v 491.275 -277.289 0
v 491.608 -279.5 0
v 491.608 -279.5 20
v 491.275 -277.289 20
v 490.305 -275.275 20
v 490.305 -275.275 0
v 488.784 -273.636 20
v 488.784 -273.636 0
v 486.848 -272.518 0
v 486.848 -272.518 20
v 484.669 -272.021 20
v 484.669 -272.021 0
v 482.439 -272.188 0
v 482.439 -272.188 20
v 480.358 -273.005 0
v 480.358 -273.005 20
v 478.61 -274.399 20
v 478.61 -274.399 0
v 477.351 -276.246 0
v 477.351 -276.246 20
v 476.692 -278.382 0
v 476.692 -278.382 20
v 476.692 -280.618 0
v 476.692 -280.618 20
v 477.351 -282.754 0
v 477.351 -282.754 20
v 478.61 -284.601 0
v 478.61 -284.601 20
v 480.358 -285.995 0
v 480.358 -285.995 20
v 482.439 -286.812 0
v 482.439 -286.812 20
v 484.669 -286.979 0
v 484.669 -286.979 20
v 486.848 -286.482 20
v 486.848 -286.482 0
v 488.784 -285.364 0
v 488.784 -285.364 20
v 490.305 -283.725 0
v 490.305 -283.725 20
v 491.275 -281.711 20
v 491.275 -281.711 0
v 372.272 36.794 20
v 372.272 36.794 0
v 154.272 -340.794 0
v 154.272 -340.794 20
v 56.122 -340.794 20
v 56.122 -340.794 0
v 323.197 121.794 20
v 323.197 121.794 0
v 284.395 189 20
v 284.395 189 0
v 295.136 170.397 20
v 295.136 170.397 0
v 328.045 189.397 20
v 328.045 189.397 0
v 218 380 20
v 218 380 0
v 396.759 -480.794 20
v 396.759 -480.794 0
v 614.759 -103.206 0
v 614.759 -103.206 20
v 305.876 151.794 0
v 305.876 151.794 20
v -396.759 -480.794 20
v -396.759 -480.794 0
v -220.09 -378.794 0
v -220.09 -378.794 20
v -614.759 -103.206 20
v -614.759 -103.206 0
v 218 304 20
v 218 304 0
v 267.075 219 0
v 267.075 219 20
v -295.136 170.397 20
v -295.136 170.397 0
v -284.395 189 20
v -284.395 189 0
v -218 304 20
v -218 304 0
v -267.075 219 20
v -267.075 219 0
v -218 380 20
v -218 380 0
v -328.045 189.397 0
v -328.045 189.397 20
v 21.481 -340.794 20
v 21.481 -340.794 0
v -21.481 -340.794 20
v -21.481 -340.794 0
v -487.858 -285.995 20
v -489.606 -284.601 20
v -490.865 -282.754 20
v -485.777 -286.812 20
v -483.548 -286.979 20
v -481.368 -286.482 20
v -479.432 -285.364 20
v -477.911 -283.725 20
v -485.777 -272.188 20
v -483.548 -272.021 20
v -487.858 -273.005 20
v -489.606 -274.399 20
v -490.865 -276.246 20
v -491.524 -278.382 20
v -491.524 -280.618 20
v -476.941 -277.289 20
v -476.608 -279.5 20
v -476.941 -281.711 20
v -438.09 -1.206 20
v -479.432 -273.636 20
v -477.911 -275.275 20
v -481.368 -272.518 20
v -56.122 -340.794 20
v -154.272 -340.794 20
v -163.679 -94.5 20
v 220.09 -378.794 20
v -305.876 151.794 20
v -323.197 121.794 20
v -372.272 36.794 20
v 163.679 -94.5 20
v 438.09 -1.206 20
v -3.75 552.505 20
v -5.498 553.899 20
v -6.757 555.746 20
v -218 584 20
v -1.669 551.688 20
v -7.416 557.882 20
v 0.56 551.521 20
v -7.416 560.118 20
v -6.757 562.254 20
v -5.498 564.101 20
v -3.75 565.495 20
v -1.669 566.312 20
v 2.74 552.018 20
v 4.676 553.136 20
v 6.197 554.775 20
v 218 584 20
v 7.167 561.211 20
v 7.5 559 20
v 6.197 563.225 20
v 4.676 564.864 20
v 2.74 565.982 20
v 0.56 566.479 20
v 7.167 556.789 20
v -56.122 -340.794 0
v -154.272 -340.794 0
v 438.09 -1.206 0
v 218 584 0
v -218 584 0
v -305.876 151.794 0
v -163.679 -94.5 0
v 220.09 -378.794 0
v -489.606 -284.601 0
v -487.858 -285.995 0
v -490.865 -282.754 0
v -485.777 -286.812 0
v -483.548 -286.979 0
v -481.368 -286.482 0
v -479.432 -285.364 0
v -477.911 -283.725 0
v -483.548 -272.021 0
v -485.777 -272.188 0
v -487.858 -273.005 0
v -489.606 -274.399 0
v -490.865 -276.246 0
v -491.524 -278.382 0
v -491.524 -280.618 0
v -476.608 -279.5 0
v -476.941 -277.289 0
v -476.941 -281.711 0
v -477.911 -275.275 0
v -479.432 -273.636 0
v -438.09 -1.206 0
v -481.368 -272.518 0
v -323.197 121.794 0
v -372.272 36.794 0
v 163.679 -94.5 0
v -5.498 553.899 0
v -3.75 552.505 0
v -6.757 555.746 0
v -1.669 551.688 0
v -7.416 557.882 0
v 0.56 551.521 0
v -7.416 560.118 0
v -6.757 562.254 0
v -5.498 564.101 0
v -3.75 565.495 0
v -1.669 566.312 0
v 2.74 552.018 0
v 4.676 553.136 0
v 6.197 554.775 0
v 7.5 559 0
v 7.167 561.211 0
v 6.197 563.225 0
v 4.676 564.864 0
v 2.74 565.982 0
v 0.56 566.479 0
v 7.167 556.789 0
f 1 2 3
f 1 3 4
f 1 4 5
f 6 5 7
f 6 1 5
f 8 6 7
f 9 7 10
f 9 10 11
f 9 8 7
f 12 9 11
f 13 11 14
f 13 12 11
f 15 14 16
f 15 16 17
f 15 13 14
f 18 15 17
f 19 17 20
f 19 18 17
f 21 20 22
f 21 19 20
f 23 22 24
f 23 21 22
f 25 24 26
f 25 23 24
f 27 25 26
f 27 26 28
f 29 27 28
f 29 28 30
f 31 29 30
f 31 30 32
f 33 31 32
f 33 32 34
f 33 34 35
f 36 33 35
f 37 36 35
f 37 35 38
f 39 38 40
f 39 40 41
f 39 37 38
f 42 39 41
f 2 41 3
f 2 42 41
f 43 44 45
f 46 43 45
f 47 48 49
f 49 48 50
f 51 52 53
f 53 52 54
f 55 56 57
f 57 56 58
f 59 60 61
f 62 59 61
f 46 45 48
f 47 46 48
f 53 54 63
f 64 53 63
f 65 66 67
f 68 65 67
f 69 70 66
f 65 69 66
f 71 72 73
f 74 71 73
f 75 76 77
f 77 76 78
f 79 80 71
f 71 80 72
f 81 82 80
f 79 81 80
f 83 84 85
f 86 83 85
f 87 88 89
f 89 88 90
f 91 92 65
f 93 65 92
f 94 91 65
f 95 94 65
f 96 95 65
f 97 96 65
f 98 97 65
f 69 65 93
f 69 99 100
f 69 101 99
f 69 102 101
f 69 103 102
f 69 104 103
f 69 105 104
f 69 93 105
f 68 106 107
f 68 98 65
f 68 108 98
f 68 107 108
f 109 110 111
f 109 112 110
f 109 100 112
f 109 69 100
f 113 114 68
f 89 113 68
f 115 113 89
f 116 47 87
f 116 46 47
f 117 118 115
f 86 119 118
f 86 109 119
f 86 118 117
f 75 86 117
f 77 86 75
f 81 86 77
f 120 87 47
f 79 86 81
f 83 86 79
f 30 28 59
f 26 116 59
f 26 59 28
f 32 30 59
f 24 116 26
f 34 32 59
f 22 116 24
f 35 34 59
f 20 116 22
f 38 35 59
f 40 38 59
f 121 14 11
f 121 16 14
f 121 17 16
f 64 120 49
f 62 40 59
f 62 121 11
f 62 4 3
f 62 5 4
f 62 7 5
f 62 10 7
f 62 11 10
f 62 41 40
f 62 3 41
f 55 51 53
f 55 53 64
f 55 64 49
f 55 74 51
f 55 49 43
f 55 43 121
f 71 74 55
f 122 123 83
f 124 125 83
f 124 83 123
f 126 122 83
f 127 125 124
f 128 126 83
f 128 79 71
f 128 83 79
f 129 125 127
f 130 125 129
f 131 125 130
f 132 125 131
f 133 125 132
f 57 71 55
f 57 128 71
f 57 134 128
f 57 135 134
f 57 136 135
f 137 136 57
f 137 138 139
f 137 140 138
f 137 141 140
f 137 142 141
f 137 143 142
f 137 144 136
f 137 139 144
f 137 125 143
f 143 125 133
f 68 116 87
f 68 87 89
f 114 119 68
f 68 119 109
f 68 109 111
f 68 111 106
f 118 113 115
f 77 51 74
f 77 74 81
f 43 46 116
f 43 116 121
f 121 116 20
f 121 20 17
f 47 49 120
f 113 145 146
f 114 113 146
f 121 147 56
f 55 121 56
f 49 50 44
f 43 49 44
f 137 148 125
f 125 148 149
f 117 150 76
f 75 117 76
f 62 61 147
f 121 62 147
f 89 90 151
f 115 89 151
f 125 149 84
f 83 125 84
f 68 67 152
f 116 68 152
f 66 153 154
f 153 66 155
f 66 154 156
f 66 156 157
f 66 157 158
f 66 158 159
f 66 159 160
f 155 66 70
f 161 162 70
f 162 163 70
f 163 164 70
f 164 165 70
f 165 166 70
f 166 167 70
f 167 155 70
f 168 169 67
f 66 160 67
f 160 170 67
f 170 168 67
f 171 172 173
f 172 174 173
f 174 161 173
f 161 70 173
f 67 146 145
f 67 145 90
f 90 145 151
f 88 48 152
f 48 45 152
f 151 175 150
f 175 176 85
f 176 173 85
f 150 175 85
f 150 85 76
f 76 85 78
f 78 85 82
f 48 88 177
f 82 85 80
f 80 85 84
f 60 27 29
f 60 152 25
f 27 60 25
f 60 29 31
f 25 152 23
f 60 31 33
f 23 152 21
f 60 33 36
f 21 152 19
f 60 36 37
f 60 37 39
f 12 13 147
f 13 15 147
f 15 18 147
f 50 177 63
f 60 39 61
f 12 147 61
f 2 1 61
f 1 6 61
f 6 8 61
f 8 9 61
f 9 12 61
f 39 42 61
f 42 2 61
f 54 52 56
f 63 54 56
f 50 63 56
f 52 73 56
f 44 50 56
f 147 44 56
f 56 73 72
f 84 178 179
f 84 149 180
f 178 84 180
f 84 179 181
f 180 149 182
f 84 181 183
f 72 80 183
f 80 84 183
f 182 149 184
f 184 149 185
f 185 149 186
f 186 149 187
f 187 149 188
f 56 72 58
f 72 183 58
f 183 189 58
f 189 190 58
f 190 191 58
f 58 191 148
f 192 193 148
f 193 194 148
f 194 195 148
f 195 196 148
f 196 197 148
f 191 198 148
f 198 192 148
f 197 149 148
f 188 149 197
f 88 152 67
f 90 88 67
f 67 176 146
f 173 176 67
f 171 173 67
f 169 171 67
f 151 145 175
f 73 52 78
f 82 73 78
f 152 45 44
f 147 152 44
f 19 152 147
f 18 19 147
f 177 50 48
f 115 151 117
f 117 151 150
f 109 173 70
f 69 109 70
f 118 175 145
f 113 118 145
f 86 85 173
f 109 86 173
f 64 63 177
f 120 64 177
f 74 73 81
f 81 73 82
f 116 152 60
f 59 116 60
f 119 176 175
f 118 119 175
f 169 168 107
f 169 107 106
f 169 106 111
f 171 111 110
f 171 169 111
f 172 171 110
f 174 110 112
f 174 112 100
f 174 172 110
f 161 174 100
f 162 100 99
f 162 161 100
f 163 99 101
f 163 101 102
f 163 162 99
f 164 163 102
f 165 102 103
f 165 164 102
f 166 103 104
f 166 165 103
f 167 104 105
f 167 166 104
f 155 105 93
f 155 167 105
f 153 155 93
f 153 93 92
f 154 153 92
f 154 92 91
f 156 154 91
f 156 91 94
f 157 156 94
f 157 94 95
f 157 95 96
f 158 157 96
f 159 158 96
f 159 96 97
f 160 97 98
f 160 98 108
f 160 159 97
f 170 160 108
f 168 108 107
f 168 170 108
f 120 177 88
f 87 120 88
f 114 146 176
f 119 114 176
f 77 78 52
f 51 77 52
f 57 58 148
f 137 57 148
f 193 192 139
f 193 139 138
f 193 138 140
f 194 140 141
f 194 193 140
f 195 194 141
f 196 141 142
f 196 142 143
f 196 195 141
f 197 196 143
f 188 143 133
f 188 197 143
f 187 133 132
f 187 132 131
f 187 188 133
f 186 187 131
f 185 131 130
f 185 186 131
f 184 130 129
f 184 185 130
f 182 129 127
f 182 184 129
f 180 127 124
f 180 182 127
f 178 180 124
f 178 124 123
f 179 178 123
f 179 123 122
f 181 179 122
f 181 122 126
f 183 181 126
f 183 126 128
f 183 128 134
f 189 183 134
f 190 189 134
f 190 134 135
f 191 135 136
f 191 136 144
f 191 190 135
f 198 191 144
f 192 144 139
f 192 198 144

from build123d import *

# Parameters (mm, degrees)
F0_R     = 7.5
F1_DEPTH = 20


with BuildPart() as f1:
    # F0 (on Top) → F1 (new body)
    with BuildSketch(Plane.XY):
        Polygon((218, 380), (218, 584), (-218, 584), (-218, 380), (-328.044827, 189.396769), (-438.089653, -1.206462), (-614.758836, -103.206462), (-396.758836, -480.793538), (-220.089653, -378.793538), (0, -378.793538), (220.089653, -378.793538), (396.758836, -480.793538), (614.758836, -103.206462), (438.089653, -1.206462), (328.044827, 189.396769), align=None)
        with Locations((-484.108201, -279.5)):
            Circle(F0_R, mode=Mode.SUBTRACT)
        Polygon((-372.271723, 36.793538), (-323.19695, 121.793538), (-56.122177, -340.793538), (-154.271723, -340.793538), align=None, mode=Mode.SUBTRACT)
        with Locations((484.108201, -279.5)):
            Circle(F0_R, mode=Mode.SUBTRACT)
        Polygon((154.271723, -340.793538), (56.122177, -340.793538), (323.19695, 121.793538), (372.271723, 36.793538), align=None, mode=Mode.SUBTRACT)
        Polygon((-295.135861, 170.396769), (-284.395281, 189), (0, 189), (284.395281, 189), (295.135861, 170.396769), (305.876442, 151.793538), (163.678801, -94.5), (21.481161, -340.793538), (0, -340.793538), (-21.481161, -340.793538), (-163.678801, -94.5), (-305.876442, 151.793538), align=None, mode=Mode.SUBTRACT)
        Polygon((-218, 304), (218, 304), (267.074773, 219), (-267.074773, 219), align=None, mode=Mode.SUBTRACT)
        with Locations((0, 559)):
            Circle(F0_R, mode=Mode.SUBTRACT)
    extrude(amount=F1_DEPTH)


solid = f1.part
